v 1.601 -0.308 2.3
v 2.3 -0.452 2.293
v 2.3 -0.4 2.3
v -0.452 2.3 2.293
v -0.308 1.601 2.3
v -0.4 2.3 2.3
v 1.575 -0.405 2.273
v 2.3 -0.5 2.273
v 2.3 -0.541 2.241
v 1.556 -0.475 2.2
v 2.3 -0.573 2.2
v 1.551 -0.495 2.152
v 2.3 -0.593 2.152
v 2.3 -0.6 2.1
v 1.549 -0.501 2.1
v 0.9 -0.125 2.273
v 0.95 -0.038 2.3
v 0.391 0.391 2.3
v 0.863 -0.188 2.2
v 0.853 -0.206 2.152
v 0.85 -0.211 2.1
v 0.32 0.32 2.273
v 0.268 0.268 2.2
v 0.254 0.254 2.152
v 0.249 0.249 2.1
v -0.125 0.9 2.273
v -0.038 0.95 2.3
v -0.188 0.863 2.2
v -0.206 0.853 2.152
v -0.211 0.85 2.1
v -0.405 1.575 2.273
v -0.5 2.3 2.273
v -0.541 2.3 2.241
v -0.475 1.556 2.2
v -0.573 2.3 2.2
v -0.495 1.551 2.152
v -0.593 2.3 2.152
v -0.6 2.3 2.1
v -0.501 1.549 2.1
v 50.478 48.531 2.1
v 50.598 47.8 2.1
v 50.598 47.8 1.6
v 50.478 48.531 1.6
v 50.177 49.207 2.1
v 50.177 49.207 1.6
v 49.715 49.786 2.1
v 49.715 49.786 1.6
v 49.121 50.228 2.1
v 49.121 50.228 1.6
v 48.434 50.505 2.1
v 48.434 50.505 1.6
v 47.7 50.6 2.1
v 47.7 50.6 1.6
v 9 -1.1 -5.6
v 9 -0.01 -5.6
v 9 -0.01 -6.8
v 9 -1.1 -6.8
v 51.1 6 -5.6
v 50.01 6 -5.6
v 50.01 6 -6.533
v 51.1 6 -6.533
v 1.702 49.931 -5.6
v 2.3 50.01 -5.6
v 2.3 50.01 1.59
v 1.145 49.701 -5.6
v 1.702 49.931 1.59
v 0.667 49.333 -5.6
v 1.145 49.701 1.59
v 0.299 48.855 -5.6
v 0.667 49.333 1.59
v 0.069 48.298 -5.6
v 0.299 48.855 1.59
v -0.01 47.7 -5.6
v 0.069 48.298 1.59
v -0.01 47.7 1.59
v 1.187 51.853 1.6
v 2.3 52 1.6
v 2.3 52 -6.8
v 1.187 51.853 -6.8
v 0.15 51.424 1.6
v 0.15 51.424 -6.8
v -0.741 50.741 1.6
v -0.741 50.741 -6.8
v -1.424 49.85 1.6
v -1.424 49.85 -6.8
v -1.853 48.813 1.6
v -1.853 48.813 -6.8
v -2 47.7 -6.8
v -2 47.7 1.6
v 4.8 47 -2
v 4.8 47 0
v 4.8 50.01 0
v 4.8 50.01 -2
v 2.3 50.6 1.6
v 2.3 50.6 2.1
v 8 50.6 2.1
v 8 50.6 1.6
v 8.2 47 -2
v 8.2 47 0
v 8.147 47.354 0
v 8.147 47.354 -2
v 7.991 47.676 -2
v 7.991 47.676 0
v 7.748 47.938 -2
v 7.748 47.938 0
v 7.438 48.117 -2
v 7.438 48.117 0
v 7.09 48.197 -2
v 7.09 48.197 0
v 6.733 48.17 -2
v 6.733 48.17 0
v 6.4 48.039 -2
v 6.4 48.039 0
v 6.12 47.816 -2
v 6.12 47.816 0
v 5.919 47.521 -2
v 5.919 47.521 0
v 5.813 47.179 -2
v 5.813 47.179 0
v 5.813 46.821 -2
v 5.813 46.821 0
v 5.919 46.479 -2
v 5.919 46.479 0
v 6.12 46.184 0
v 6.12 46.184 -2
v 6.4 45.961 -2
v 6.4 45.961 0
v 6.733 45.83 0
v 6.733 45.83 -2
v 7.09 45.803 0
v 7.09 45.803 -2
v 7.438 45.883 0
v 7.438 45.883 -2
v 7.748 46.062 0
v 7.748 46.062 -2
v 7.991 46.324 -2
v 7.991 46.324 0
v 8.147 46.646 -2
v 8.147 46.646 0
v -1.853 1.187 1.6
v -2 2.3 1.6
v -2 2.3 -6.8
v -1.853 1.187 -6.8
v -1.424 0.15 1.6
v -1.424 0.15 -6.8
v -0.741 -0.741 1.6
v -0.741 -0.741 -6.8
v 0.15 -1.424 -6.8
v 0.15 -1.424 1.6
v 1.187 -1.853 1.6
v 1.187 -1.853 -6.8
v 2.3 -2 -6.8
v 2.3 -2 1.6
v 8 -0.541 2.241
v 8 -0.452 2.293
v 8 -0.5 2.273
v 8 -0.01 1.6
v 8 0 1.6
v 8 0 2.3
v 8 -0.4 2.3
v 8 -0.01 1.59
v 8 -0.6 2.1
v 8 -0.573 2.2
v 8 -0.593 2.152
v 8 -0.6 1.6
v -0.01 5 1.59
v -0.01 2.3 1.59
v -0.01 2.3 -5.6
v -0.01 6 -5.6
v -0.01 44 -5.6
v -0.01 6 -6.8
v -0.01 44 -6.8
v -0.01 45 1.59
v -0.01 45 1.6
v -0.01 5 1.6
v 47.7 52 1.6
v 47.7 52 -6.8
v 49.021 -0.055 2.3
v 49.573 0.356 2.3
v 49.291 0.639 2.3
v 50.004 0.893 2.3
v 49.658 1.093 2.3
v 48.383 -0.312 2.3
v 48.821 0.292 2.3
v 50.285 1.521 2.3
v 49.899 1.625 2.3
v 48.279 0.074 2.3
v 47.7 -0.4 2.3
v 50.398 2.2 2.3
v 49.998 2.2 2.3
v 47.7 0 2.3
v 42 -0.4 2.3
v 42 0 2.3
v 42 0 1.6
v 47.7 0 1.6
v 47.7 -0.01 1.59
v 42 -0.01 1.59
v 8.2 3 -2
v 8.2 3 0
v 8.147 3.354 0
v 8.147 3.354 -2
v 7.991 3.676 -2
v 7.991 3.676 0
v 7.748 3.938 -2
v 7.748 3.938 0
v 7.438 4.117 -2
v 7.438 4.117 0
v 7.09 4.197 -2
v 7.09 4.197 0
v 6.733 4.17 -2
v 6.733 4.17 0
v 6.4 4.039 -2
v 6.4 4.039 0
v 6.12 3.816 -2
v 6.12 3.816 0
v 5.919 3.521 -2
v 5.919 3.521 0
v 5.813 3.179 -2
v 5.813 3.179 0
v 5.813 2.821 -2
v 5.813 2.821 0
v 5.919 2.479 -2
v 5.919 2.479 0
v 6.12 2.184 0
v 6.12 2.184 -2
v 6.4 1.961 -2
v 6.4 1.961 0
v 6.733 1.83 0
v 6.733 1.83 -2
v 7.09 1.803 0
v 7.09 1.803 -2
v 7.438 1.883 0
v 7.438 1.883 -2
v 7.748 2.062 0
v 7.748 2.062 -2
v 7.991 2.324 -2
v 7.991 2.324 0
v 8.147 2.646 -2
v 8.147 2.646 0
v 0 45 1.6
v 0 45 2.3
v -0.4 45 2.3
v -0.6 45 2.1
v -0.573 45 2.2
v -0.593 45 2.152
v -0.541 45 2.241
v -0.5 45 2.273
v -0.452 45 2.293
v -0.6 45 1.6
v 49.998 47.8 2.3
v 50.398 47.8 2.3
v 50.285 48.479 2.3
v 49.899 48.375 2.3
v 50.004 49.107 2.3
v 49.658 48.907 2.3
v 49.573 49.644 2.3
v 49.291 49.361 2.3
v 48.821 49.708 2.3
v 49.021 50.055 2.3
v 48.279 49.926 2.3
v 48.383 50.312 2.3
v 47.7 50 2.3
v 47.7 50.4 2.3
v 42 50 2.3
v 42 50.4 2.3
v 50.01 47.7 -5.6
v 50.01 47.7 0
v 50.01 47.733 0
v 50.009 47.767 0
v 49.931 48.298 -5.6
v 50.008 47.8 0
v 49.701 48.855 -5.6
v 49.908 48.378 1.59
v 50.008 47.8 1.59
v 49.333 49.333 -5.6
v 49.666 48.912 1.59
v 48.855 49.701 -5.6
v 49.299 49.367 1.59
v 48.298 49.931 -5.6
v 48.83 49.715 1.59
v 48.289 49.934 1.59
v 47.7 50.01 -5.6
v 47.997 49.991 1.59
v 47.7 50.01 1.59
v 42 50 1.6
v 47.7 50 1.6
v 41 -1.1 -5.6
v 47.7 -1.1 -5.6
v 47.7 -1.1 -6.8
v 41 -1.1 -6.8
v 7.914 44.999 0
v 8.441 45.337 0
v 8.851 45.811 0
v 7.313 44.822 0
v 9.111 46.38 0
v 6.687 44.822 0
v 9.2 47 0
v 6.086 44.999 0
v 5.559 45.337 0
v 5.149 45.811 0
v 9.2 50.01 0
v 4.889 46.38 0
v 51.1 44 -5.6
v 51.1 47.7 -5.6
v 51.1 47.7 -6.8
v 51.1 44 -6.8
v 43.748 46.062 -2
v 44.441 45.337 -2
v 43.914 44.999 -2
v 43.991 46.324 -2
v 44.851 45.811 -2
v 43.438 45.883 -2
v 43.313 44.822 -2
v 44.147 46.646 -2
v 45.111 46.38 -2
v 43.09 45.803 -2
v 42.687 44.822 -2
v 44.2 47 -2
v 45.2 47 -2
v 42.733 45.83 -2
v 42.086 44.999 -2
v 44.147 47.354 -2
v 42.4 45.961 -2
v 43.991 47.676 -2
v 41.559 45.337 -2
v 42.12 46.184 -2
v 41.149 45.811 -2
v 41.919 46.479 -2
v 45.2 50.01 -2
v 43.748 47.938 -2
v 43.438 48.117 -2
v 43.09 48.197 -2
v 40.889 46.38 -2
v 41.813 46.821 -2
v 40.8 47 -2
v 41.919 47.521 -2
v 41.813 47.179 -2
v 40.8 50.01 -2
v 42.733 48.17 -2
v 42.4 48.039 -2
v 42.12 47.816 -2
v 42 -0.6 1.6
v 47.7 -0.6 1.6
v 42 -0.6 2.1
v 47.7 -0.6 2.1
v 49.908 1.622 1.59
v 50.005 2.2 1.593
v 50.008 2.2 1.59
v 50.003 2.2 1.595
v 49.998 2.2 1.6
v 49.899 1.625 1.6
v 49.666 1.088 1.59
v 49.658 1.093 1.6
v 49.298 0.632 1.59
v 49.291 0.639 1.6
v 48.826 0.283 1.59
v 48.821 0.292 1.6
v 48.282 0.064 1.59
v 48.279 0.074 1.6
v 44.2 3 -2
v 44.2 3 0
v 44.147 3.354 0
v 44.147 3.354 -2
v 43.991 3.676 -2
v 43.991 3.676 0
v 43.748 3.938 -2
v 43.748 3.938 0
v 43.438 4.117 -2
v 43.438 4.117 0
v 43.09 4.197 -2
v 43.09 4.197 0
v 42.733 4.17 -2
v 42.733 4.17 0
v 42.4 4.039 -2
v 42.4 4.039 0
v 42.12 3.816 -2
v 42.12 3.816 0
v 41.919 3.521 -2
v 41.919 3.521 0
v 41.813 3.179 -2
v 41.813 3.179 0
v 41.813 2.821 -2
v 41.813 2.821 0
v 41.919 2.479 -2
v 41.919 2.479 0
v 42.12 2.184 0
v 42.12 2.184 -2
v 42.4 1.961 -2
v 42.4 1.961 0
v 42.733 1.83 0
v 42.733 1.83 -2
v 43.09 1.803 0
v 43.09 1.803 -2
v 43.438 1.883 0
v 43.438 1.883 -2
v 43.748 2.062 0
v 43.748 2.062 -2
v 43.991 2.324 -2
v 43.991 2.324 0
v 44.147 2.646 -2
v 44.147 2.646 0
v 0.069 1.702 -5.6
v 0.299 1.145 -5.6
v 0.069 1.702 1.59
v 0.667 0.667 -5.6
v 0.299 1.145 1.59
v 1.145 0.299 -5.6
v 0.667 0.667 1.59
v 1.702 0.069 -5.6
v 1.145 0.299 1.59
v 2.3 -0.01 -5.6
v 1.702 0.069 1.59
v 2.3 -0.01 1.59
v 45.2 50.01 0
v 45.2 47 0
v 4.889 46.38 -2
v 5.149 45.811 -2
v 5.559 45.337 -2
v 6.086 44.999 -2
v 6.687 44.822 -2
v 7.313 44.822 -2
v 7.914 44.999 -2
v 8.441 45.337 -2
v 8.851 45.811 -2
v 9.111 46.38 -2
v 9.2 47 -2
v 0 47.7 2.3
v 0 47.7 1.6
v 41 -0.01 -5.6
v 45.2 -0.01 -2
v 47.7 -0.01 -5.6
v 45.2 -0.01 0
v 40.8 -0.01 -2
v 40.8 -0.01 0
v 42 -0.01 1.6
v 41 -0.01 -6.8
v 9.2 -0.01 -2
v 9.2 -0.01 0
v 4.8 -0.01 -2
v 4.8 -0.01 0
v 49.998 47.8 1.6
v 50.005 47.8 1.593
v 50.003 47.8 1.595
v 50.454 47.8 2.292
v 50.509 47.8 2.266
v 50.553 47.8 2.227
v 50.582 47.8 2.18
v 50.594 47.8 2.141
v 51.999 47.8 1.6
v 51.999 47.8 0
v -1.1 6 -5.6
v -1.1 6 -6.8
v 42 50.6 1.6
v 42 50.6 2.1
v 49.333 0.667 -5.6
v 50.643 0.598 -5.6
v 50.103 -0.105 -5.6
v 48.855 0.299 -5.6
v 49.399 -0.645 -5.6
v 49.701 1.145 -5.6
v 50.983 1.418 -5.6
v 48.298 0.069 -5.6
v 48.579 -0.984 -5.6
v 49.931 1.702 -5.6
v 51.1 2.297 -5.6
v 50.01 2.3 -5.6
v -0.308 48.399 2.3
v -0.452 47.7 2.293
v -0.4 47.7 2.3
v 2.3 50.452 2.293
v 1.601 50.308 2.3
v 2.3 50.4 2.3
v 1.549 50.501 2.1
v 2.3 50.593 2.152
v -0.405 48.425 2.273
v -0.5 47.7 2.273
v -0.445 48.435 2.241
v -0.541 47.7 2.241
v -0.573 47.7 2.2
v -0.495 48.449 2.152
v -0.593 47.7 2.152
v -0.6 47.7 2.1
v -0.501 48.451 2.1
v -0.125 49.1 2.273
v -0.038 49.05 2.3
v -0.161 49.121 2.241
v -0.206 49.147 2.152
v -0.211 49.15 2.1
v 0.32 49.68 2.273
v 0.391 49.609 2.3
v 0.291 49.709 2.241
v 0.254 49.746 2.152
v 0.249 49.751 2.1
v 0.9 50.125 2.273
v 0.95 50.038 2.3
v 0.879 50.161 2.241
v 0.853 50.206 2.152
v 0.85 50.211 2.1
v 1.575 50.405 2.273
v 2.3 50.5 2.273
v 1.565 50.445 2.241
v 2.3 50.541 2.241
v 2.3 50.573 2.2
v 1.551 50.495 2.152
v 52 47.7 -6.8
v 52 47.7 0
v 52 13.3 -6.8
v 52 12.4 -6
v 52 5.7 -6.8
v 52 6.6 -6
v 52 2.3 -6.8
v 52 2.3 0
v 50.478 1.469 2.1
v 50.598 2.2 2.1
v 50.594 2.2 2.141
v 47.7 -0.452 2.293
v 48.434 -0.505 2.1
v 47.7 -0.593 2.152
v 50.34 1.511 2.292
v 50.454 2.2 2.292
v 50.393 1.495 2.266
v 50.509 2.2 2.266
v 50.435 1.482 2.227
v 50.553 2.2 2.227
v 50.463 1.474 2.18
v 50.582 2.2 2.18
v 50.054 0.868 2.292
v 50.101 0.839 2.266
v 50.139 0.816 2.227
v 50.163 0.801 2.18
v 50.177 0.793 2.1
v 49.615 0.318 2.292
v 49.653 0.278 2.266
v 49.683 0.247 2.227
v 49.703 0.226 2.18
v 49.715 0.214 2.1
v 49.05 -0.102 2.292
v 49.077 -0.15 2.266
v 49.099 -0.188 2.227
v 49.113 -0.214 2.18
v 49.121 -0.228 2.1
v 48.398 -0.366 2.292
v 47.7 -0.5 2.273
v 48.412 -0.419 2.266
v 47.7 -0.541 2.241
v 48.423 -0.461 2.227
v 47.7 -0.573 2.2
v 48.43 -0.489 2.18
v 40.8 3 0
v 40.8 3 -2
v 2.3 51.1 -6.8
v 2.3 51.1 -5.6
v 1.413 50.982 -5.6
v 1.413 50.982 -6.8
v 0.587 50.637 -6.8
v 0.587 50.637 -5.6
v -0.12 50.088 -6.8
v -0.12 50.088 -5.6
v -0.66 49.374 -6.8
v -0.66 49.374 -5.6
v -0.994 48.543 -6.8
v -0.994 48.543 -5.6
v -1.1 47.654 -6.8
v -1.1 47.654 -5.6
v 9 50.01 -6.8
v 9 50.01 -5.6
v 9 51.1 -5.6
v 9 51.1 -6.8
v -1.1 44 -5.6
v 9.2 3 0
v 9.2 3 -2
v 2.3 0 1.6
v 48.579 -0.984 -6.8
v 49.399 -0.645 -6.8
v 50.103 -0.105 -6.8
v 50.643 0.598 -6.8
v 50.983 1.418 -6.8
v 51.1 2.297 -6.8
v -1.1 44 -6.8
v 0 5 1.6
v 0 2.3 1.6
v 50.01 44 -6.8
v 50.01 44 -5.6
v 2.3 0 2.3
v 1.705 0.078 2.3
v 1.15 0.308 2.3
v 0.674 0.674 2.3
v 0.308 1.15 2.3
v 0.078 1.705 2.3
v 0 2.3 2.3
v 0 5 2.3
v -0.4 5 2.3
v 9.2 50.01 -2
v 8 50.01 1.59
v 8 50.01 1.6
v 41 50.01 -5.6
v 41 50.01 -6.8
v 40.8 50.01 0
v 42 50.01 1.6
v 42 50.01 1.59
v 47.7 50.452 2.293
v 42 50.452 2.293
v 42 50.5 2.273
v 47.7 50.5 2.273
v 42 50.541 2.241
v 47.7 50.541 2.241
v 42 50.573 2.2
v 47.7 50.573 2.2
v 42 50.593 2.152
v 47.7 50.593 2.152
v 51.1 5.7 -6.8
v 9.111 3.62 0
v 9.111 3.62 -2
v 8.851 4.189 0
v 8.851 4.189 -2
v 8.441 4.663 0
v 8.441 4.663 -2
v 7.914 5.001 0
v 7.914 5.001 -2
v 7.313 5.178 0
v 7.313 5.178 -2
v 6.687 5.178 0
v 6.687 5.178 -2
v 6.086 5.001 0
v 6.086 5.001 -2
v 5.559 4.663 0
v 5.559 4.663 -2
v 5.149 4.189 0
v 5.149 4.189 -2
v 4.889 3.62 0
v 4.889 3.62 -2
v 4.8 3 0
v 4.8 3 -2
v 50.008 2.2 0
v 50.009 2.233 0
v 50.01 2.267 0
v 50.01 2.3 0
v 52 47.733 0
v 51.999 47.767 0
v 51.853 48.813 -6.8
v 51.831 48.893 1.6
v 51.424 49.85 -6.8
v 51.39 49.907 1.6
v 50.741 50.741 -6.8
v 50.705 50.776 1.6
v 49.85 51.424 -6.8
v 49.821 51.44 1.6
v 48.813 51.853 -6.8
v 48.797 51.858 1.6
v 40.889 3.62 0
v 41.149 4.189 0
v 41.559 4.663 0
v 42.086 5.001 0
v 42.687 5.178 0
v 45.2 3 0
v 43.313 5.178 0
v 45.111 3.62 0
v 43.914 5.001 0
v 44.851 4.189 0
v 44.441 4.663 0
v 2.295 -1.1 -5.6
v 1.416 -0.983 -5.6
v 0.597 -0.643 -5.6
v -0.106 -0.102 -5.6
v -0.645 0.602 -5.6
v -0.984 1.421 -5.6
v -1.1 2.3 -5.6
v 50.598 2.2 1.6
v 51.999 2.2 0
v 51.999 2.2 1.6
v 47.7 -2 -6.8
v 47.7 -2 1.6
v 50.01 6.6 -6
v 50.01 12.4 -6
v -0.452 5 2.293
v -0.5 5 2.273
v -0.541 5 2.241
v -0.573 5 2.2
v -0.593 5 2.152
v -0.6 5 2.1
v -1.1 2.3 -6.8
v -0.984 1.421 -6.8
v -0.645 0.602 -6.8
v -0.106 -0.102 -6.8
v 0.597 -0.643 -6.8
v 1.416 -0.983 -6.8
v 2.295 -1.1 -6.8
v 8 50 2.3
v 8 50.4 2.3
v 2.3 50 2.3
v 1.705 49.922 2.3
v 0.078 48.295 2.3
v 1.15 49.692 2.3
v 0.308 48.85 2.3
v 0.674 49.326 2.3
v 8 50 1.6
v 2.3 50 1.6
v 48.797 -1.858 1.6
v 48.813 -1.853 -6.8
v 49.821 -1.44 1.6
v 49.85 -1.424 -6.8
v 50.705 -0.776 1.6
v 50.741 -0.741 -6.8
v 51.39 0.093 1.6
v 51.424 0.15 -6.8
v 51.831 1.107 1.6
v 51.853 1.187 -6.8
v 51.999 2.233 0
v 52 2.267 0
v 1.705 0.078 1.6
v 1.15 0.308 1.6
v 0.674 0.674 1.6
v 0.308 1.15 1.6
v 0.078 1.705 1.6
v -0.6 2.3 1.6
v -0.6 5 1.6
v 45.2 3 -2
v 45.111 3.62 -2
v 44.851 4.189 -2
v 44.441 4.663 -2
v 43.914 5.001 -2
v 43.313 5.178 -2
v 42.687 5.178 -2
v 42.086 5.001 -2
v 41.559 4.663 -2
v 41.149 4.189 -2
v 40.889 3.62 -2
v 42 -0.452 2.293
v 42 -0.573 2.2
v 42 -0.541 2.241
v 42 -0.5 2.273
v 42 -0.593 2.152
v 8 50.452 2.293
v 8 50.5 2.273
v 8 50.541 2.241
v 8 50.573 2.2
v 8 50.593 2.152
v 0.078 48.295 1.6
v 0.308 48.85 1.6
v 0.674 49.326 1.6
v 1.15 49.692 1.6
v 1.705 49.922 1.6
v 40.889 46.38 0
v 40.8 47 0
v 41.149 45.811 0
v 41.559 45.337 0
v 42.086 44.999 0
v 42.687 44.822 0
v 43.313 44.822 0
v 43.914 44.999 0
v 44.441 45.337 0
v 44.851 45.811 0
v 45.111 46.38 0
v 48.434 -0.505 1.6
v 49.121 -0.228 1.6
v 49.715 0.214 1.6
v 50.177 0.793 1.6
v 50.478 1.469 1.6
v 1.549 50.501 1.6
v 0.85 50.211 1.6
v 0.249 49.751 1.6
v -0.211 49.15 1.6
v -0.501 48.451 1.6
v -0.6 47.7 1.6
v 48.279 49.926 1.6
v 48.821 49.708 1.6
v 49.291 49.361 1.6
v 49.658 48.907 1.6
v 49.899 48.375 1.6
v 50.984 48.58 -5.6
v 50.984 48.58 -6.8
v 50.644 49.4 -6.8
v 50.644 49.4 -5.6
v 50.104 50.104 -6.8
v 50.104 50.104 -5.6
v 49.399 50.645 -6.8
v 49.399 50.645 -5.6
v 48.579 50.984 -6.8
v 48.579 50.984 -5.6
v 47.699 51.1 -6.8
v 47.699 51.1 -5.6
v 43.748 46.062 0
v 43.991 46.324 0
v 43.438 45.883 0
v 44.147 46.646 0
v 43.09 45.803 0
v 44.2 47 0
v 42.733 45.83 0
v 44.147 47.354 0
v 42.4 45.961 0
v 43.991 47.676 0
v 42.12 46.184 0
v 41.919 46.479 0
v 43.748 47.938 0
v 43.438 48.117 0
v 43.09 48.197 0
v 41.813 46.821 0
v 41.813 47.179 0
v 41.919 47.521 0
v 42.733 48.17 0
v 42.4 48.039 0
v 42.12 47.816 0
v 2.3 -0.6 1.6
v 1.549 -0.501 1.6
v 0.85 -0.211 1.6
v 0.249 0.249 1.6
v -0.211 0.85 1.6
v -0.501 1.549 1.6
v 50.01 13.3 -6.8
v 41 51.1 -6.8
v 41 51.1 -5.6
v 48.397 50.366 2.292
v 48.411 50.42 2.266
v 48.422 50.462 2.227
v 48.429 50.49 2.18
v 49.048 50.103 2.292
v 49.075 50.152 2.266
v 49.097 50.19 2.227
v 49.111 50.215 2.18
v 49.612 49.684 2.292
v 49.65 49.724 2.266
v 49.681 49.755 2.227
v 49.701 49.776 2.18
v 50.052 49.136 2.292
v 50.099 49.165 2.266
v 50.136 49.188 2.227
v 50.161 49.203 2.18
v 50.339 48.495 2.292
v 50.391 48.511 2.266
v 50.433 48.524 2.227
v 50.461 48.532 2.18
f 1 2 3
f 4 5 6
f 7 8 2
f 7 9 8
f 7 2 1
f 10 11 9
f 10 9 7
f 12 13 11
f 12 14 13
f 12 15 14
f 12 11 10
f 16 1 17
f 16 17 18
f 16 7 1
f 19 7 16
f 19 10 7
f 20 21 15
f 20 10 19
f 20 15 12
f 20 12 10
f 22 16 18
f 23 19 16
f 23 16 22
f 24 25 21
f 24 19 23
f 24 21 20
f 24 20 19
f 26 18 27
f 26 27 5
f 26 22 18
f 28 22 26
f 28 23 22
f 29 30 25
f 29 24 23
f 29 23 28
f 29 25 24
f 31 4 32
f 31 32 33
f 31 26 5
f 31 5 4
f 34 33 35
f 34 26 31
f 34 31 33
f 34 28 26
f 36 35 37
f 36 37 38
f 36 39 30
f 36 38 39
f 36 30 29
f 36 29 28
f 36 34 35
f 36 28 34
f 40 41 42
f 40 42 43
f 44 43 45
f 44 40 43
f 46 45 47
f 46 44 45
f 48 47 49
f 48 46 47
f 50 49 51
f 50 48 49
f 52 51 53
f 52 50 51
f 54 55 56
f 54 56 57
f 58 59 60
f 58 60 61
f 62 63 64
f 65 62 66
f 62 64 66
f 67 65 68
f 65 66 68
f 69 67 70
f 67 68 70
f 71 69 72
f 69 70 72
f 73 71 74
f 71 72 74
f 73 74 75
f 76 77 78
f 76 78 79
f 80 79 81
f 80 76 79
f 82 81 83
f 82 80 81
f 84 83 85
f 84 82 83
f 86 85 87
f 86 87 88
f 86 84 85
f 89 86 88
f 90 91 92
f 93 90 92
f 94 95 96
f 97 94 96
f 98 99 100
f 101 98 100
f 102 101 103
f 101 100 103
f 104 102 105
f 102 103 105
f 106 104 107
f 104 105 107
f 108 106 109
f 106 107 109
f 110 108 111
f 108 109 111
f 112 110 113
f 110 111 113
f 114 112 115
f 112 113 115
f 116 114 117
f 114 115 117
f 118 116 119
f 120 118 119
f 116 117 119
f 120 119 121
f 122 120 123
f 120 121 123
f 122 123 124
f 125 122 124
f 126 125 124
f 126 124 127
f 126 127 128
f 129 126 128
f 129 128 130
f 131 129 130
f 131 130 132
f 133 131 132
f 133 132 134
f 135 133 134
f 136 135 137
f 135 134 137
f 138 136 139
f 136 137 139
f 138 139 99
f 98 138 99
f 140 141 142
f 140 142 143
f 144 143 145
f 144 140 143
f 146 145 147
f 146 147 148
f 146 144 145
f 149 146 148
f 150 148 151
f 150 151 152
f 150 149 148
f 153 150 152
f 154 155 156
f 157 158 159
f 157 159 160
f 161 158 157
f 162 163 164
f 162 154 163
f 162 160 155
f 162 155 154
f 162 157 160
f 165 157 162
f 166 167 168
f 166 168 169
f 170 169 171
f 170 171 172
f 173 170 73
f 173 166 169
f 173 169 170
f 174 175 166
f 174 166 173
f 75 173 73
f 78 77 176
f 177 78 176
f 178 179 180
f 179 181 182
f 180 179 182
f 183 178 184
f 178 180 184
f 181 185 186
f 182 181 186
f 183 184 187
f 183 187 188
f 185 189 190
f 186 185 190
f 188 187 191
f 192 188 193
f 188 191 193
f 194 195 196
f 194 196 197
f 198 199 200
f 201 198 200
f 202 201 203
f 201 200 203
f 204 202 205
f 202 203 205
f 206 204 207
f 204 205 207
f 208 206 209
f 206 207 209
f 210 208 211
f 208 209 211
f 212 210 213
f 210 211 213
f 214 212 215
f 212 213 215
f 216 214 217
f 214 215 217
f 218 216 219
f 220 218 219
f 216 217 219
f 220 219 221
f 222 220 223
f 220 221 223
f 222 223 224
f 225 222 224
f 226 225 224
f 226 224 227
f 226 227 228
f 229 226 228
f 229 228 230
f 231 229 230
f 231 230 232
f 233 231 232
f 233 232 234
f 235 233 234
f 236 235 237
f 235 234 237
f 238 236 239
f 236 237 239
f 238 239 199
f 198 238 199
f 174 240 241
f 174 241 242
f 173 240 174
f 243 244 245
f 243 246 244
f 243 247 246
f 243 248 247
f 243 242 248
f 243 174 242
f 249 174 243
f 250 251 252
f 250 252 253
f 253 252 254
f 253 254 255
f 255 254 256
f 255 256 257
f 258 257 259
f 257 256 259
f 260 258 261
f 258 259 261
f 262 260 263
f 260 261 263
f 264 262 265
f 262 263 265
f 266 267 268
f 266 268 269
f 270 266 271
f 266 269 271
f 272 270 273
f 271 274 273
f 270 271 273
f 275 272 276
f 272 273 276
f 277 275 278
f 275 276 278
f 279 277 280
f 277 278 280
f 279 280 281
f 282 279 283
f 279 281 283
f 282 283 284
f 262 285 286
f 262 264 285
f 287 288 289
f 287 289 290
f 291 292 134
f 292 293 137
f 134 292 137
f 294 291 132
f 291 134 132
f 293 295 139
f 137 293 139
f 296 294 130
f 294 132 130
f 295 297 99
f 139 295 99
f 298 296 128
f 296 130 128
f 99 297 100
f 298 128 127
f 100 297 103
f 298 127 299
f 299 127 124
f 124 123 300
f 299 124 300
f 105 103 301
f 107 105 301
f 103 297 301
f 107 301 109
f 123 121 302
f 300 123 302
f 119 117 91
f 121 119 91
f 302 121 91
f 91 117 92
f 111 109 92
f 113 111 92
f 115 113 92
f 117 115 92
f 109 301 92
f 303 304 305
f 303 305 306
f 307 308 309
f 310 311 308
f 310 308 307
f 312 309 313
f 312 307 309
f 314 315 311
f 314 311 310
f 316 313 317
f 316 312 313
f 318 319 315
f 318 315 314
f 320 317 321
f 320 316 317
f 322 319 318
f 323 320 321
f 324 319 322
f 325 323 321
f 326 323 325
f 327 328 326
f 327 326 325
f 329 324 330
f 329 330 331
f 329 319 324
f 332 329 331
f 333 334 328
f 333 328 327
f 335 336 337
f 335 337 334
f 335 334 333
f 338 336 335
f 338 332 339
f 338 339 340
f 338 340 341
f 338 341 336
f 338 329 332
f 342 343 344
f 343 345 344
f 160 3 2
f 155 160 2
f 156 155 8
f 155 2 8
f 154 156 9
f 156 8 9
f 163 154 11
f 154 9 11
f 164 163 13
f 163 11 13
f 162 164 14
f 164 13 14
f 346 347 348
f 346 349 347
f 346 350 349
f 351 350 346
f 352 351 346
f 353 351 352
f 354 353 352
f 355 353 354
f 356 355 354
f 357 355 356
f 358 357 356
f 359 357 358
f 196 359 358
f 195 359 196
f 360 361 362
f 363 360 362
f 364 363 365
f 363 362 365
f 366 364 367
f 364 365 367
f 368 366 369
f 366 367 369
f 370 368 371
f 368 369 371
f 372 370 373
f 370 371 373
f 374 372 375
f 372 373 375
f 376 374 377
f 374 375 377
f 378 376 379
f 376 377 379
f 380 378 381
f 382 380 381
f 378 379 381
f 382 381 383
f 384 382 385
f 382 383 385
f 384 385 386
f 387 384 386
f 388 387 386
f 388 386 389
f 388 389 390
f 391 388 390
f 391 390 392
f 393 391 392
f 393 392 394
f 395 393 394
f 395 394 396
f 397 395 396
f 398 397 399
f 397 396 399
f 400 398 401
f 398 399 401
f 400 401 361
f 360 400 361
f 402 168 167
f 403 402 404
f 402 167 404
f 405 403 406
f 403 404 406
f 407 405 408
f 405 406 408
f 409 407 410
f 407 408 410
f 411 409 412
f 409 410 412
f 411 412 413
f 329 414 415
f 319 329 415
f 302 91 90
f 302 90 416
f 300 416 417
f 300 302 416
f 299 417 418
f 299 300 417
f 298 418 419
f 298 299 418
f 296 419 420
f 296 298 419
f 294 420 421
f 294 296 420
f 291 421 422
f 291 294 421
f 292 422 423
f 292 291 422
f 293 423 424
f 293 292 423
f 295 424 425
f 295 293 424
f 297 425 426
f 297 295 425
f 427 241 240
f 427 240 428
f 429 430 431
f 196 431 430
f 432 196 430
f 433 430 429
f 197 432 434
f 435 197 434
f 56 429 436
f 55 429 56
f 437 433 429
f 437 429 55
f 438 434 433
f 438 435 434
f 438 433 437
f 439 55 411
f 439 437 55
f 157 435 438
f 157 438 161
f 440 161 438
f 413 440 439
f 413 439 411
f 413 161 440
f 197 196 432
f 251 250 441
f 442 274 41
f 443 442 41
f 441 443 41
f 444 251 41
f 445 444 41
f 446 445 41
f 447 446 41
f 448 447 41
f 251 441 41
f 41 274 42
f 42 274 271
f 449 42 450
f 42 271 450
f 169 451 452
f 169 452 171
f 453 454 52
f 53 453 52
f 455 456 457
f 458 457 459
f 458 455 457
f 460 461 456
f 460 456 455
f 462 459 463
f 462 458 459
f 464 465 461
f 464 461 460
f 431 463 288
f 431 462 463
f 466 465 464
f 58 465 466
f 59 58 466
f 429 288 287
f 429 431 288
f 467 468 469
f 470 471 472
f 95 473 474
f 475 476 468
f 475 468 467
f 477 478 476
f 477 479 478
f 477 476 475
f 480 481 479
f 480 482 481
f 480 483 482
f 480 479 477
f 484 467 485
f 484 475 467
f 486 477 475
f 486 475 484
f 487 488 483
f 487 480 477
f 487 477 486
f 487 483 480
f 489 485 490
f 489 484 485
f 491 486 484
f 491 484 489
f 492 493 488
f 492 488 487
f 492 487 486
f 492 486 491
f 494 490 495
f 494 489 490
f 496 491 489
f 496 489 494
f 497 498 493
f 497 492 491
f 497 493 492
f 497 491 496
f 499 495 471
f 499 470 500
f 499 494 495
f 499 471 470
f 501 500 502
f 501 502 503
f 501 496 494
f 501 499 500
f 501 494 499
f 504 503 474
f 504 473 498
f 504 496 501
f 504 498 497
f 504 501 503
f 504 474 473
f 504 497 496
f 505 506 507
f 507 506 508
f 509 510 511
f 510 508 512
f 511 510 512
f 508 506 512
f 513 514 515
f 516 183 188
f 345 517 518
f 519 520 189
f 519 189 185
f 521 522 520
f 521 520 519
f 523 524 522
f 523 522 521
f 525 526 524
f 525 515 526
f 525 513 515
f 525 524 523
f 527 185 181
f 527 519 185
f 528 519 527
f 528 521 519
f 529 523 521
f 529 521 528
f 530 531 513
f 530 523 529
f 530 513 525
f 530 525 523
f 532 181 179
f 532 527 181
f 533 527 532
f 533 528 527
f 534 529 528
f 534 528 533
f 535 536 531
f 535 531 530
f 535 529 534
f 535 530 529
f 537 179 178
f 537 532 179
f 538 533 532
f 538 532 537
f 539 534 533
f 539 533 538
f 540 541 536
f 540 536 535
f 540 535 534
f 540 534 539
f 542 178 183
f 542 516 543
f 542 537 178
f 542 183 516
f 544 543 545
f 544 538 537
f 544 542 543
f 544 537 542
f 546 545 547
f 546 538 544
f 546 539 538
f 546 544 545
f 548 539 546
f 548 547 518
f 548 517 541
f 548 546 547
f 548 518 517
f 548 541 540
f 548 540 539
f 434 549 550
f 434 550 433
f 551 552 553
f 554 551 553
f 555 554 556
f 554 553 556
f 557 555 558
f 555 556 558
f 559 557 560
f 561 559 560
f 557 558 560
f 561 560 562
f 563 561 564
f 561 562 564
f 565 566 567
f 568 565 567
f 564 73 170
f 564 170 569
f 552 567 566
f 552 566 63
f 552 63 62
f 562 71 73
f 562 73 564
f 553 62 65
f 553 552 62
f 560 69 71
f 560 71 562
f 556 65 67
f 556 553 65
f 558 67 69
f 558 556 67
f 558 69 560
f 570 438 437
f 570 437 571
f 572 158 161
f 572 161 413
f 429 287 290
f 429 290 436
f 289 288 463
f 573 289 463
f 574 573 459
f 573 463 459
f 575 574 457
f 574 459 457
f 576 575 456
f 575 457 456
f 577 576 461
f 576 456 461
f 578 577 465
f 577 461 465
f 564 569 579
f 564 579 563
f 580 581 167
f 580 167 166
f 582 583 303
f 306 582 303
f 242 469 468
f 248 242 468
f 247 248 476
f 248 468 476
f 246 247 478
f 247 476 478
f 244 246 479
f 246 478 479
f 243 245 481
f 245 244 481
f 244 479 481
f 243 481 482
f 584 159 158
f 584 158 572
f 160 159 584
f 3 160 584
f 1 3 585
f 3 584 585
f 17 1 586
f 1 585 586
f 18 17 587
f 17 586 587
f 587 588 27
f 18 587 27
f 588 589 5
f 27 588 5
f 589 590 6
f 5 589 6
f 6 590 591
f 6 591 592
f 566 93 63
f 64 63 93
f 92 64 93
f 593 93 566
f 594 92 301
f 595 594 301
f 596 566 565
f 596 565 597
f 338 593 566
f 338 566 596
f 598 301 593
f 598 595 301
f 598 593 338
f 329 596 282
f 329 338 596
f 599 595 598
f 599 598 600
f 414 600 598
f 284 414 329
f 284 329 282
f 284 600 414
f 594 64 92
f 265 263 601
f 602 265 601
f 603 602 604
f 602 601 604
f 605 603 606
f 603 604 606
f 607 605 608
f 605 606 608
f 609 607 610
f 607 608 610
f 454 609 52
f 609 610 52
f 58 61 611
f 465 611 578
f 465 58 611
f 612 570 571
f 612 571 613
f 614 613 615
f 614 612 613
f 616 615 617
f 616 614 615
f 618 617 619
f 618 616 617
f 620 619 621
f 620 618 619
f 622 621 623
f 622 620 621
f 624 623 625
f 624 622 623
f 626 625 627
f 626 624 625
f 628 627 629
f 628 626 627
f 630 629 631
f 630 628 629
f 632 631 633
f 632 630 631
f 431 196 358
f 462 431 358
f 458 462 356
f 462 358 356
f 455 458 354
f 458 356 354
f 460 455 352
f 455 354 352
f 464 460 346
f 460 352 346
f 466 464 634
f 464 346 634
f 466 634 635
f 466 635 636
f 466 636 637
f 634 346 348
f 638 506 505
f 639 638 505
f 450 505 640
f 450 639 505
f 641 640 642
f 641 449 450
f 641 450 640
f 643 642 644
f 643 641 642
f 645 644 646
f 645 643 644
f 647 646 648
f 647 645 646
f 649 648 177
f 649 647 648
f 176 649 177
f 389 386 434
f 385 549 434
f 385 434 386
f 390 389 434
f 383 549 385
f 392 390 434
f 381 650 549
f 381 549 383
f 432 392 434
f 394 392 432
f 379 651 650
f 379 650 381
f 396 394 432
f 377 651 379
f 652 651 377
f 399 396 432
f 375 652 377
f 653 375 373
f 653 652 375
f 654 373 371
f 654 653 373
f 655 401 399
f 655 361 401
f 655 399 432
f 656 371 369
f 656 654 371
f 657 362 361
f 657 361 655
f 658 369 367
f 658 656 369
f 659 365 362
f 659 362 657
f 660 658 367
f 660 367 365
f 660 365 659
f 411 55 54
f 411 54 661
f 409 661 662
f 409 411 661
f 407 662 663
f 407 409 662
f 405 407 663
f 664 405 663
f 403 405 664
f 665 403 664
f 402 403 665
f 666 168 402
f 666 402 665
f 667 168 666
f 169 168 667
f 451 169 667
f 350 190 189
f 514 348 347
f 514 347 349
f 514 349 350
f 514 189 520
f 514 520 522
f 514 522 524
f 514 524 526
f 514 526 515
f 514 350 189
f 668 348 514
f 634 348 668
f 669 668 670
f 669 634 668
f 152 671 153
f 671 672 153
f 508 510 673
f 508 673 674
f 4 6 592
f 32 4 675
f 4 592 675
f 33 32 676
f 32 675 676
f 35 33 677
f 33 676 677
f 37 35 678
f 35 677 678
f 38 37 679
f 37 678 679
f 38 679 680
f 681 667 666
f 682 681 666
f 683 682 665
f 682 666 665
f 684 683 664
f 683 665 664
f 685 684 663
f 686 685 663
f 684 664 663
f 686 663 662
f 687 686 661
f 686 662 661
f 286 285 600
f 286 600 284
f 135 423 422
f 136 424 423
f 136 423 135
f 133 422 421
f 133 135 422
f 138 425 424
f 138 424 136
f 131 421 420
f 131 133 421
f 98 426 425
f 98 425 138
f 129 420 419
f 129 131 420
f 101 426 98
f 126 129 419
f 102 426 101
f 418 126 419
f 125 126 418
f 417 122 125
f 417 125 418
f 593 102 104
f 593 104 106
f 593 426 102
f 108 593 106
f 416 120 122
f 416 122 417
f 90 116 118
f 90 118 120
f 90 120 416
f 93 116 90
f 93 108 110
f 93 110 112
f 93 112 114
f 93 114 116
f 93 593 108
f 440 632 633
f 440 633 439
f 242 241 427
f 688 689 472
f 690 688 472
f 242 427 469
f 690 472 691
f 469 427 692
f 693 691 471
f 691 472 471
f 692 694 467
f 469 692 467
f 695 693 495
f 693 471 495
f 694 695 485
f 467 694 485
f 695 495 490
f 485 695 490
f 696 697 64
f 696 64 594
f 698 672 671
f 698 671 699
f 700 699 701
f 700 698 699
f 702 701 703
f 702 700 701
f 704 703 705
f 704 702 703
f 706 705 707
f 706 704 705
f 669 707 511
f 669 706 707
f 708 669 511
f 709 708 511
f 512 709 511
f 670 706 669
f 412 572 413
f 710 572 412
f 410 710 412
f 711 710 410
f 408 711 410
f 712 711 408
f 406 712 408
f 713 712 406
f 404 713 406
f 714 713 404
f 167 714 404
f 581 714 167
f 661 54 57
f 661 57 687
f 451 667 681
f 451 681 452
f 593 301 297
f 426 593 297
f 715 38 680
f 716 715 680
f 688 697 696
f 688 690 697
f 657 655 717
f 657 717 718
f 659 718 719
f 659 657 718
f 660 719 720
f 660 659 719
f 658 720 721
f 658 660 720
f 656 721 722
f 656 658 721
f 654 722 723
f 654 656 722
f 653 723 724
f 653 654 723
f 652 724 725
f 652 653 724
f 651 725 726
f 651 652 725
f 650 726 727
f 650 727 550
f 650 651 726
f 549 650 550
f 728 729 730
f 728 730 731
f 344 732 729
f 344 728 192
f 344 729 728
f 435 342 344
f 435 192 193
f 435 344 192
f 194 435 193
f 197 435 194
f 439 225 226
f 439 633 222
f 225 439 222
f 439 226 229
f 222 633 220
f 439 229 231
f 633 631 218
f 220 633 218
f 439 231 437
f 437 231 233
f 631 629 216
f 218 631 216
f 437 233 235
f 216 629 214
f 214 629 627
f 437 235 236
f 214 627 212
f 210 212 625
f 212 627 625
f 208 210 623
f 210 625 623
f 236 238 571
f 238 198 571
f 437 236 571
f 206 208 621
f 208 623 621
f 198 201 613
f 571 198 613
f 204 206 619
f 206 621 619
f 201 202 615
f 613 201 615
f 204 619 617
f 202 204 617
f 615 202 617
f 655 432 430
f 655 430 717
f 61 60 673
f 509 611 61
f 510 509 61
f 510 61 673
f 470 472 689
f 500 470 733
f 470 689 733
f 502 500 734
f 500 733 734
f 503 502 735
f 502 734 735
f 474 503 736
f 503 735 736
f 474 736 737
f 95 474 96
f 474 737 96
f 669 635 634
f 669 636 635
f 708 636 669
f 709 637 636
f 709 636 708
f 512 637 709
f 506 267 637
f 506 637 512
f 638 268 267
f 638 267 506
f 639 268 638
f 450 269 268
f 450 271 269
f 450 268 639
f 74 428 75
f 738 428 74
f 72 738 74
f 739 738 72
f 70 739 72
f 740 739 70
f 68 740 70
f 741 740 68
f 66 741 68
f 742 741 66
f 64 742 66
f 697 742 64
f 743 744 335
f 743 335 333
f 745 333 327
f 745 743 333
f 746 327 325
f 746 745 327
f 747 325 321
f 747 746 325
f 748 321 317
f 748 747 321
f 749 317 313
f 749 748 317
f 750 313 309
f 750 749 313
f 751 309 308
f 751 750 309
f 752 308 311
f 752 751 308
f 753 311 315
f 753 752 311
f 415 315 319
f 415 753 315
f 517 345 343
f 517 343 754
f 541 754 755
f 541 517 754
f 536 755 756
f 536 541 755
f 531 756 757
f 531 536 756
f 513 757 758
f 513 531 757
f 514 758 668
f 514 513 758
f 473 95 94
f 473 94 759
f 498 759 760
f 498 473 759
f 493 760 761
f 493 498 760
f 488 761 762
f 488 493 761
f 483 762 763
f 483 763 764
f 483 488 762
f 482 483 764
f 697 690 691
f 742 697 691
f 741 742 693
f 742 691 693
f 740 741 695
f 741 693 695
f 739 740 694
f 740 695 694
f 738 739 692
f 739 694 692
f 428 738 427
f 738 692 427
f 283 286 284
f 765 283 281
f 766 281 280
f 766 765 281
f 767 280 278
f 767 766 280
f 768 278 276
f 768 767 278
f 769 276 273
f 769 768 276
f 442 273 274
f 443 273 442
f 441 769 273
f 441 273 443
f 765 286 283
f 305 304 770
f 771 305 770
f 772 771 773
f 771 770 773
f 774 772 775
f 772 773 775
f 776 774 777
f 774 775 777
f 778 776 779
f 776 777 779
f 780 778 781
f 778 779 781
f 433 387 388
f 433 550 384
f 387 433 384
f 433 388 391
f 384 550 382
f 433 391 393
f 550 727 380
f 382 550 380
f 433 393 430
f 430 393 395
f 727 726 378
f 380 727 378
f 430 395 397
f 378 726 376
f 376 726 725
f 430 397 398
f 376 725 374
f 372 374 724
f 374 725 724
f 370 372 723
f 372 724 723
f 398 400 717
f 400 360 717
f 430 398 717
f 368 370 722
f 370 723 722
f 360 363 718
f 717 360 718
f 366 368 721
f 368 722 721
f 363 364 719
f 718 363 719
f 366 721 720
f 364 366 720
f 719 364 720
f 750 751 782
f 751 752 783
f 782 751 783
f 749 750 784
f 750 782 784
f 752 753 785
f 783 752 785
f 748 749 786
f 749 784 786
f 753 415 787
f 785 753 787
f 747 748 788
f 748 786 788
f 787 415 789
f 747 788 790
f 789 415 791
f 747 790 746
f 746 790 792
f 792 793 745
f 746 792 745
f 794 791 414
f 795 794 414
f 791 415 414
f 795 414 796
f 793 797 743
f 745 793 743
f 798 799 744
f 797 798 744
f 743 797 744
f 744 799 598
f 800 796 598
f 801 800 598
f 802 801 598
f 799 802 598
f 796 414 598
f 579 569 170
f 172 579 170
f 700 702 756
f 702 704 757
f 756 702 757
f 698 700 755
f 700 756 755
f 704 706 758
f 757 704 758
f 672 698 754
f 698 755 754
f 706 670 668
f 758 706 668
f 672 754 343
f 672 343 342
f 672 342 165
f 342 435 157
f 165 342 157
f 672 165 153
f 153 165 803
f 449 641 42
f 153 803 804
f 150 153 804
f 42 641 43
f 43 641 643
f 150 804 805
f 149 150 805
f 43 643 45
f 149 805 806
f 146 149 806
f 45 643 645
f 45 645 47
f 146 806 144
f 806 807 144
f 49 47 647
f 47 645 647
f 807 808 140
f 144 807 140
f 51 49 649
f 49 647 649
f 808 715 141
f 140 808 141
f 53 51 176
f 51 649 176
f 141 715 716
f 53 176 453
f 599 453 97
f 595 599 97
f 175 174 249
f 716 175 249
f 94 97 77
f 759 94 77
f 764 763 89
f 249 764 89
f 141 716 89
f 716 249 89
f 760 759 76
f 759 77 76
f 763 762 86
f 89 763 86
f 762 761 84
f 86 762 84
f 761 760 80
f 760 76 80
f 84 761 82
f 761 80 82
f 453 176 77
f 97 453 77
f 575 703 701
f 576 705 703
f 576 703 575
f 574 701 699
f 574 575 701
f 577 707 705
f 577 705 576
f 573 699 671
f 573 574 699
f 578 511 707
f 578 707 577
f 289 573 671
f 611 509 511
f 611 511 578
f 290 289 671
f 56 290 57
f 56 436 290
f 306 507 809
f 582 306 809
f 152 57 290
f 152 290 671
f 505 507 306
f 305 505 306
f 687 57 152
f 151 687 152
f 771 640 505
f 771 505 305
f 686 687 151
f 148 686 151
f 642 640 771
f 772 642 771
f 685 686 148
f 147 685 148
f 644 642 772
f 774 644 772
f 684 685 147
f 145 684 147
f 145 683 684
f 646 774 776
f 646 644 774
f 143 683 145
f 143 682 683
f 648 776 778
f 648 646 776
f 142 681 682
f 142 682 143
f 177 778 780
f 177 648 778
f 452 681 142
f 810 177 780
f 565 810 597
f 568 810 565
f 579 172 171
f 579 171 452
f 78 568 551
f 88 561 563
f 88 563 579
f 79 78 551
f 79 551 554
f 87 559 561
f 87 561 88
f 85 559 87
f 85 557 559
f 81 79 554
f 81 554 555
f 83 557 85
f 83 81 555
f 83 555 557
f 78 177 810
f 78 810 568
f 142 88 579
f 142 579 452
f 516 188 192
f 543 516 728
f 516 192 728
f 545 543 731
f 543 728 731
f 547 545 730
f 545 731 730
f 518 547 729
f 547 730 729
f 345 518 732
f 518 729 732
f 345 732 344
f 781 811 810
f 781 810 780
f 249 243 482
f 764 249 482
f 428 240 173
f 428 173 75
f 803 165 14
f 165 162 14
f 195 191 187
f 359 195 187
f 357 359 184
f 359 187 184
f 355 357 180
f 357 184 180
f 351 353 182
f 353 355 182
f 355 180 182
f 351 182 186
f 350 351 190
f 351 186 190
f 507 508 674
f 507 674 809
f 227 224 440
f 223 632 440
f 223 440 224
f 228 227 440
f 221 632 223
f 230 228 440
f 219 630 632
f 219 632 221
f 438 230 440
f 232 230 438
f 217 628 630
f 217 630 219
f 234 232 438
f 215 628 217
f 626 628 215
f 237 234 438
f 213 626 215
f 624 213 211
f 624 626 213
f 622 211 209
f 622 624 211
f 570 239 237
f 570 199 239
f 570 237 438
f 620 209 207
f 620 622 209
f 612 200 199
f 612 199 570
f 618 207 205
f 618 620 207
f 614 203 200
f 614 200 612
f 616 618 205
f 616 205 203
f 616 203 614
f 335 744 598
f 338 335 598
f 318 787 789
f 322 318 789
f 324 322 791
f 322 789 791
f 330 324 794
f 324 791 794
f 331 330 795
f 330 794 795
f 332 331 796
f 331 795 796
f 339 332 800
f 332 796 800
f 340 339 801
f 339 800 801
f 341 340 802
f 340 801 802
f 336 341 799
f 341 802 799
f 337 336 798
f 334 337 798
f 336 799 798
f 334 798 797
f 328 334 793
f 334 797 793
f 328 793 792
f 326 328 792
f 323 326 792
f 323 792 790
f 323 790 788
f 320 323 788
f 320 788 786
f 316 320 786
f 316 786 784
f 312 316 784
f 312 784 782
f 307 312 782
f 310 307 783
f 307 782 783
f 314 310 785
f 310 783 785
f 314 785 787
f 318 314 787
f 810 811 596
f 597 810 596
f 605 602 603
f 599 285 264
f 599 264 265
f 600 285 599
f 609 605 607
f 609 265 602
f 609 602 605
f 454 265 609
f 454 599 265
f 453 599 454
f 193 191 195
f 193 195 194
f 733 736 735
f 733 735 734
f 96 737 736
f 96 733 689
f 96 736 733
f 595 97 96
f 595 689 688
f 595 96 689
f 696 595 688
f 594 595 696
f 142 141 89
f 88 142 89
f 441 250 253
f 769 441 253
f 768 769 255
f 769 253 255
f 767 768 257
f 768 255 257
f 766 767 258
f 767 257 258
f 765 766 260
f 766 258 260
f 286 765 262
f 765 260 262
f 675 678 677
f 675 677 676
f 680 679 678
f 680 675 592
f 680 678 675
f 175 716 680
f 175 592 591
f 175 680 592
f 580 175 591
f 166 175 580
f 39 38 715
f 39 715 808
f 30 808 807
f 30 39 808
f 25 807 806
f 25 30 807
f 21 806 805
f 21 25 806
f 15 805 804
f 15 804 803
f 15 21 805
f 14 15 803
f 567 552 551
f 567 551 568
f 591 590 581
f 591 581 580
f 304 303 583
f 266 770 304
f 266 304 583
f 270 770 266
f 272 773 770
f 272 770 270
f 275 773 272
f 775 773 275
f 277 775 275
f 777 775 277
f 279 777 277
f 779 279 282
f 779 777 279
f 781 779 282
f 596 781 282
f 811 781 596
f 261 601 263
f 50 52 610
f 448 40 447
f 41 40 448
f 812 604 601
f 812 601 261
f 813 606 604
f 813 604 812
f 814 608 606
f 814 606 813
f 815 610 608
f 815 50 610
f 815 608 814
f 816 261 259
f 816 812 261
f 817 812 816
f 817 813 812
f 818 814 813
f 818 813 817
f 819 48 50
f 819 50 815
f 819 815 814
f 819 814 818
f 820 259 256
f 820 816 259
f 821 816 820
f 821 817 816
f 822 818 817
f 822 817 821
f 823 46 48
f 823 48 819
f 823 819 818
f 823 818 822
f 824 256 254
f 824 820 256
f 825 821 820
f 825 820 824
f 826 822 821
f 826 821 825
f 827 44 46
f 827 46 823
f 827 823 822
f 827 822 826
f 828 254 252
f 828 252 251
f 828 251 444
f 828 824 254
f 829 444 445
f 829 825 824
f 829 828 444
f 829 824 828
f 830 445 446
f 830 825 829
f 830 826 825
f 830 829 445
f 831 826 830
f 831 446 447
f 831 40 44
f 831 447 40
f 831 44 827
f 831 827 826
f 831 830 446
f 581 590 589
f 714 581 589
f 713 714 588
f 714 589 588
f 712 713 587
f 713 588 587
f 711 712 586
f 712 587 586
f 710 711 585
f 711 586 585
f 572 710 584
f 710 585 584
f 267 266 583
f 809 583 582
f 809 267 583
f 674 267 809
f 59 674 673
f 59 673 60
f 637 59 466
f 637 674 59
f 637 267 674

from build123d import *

# Parameters (mm, degrees)
EXTRUDE006_DEPTH                     = 2
EXTRUDE006_ONTO_SKETCH006_ROLL_ANGLE = 90
EXTRUDE006_PLACEMENT_ANGLE           = 90
SKETCH_W                             = 14.047477
SKETCH_H                             = 45.6
EXTRUDE004_DEPTH                     = 10
SKETCH002_R                          = 1.2
EXTRUDE001_DEPTH                     = 2
EXTRUDE005_DEPTH                     = 10
EXTRUDE003_DEPTH                     = 0.7
EXTRUDE003_DEPTH_BACK                = 0.2
FILLET_R                             = 0.2
CHAMFER_SIZE                         = 0.2
EXTRUDE002_DEPTH                     = 2
EXTRUDE_DEPTH                        = 1.6
EXTRUDE_DEPTH_BACK                   = 6.8


with BuildPart() as extrude006:
    # Sketch006 as drawn → Extrude006 (new, symmetric)
    with BuildSketch(Plane.XY):
        Polygon((-3.8, 0), (-2.9, 0.8), (2.9, 0.8), (3.8, 0), align=None)
    extrude(amount=EXTRUDE006_DEPTH, both=True)


with BuildPart() as extrude006_1:
    # Extrude006 onto Sketch006 roll: moved
    add(extrude006.part.rotate(Axis((0, 0, 0), (1, 0, 0)), EXTRUDE006_ONTO_SKETCH006_ROLL_ANGLE))


with BuildPart() as extrude006_2:
    # Extrude006 onto Sketch006 placement: moved
    add(extrude006_1.part)


with BuildPart() as extrude006_3:
    # Extrude006 placement: moved
    add(extrude006_2.part.moved(Location((50, 9.5, -6.8))).rotate(Axis((50, 9.5, -6.8), (0, 0, 1)), EXTRUDE006_PLACEMENT_ANGLE))


with BuildPart() as extrude004:
    # Sketch → Extrude004 (new body)
    with BuildSketch(Plane.XY):
        with Locations((51.252235, 25)):
            Rectangle(SKETCH_W, SKETCH_H)
    extrude(amount=EXTRUDE004_DEPTH)


with BuildPart() as extrude001:
    # Sketch002 → Extrude001 (new body)
    with BuildSketch(Plane.XY):
        with BuildLine():
            Line((4.8, 47), (4.8, 51))
            Line((4.8, 51), (9.2, 51))
            Line((9.2, 51), (9.2, 47.000001))
            ThreePointArc((4.8, 47), (7, 44.8), (9.2, 47.000001))
        make_face()
        with Locations((7, 47)):
            Circle(SKETCH002_R, mode=Mode.SUBTRACT)
        with BuildLine():
            ThreePointArc((9.2, 3), (7, 5.2), (4.8, 3))
            Line((4.8, 3), (4.8, -1))
            Line((4.8, -1), (9.2, -1))
            Line((9.2, -1), (9.2, 3))
        make_face()
        with Locations((7, 3)):
            Circle(SKETCH002_R, mode=Mode.SUBTRACT)
        with BuildLine():
            Line((40.8, 47), (40.8, 51))
            Line((40.8, 51), (45.2, 51))
            Line((45.2, 51), (45.2, 46.999987))
            ThreePointArc((40.8, 47), (42.999993, 44.8), (45.2, 46.999987))
        make_face()
        with Locations((43, 47)):
            Circle(SKETCH002_R, mode=Mode.SUBTRACT)
        with BuildLine():
            ThreePointArc((45.2, 3), (43, 5.2), (40.8, 3))
            Line((40.8, 3), (40.8, -1))
            Line((40.8, -1), (45.2, -1))
            Line((45.2, -1), (45.2, 3))
        make_face()
        with Locations((43, 3)):
            Circle(SKETCH002_R, mode=Mode.SUBTRACT)
    extrude(amount=-EXTRUDE001_DEPTH)


with BuildPart() as extrude005:
    # Sketch005 → Extrude005 (new body)
    with BuildSketch(Plane.XY):
        Polygon((8, 53), (8, 45), (-3, 45), (-3, 5), (8, 5), (8, -3), (42, -3), (42, 5), (53, 5), (53, 45), (42, 45), (42, 53), align=None)
    extrude(amount=EXTRUDE005_DEPTH)


with BuildPart() as cut003:
    # Sketch004 → Extrude003 (new body, two sides)
    with BuildSketch(Plane.XY) as extrude003_sk:
        with BuildLine():
            Line((2.3, 50.6), (47.7, 50.6))
            ThreePointArc((50.6, 47.7), (49.75061, 49.75061), (47.7, 50.6))
            Line((50.6, 47.7), (50.6, 2.3))
            ThreePointArc((47.7, -0.6), (49.75061, 0.24939), (50.6, 2.3))
            Line((47.7, -0.6), (2.3, -0.6))
            ThreePointArc((-0.6, 2.3), (0.24939, 0.24939), (2.3, -0.6))
            Line((-0.6, 2.3), (-0.6, 47.7))
            ThreePointArc((2.3, 50.6), (0.24939, 49.75061), (-0.6, 47.7))
        make_face()
        with BuildLine():
            Line((2.3, 50), (47.7, 50))
            ThreePointArc((50, 47.7), (49.326346, 49.326346), (47.7, 50))
            Line((50, 47.7), (50, 2.3))
            ThreePointArc((47.7, 0), (49.326346, 0.673654), (50, 2.3))
            Line((47.7, 0), (2.3, 0))
            ThreePointArc((0, 2.3), (0.673654, 0.673654), (2.3, 0))
            Line((0, 2.3), (0, 47.7))
            ThreePointArc((2.3, 50), (0.673654, 49.326346), (0, 47.7))
        make_face(mode=Mode.SUBTRACT)
    extrude(amount=EXTRUDE003_DEPTH)
    extrude(extrude003_sk.sketch, amount=-EXTRUDE003_DEPTH_BACK)


with BuildPart() as cut003_1:
    # Extrude003 placement: moved
    add(cut003.part.moved(Location((0, 0, 1.6))))

    # Fillet
    fillet_edges = [cut003_1.edges().sort_by_distance(p)[0] for p in [
        (-0.6, 25, 2.3),
        (0.24939, 49.75061, 2.3),
        (25, 50.6, 2.3),
        (49.75061, 49.75061, 2.3),
        (50.6, 25, 2.3),
        (49.75061, 0.24939, 2.3),
        (25, -0.6, 2.3),
        (0.24939, 0.24939, 2.3),
    ]]
    fillet(fillet_edges, radius=FILLET_R)

    # Chamfer
    chamfer_edges = [cut003_1.edges().sort_by_distance(p)[0] for p in [
        (0, 25, 1.4),
        (0.673654, 49.326346, 1.4),
        (25, 50, 1.4),
        (49.326346, 49.326346, 1.4),
        (50, 25, 1.4),
        (49.326346, 0.673654, 1.4),
        (25, 0, 1.4),
        (0.673654, 0.673654, 1.4),
    ]]
    chamfer(chamfer_edges, length=CHAMFER_SIZE)

    # Cut003: cut Extrude005
    add(extrude005.part, mode=Mode.SUBTRACT)


with BuildPart() as extrude002:
    # Sketch003 → Extrude002 (new body)
    with BuildSketch(Plane.XY):
        with BuildLine():
            Line((2.3, 51.1), (9, 51.1))
            Line((9, 44), (9, 51.1))
            Line((-1.1, 44), (9, 44))
            Line((-1.1, 44), (-1.1, 47.654452))
            ThreePointArc((2.3, 51.1), (-0.12032, 50.088024), (-1.1, 47.654452))
        make_face()
        with BuildLine():
            Line((51.1, 47.699699), (51.1, 44))
            Line((41, 44), (51.1, 44))
            Line((41, 51.1), (41, 44))
            Line((41, 51.1), (47.698586, 51.1))
            ThreePointArc((51.1, 47.699699), (50.103681, 50.104468), (47.698586, 51.1))
        make_face()
        with BuildLine():
            Line((47.6997, -1.1), (41, -1.1))
            Line((41, -1.1), (41, 6))
            Line((41, 6), (51.1, 6))
            Line((51.1, 6), (51.1, 2.297304))
            ThreePointArc((47.6997, -1.1), (50.103016, -0.105134), (51.1, 2.297304))
        make_face()
        with BuildLine():
            Line((-1.1, 2.300296), (-1.1, 6))
            Line((-1.1, 6), (9, 6))
            Line((9, 6), (9, -1.1))
            Line((9, -1.1), (2.294563, -1.1))
            ThreePointArc((-1.1, 2.300296), (-0.106103, -0.10205), (2.294563, -1.1))
        make_face()
    extrude(amount=-EXTRUDE002_DEPTH)


with BuildPart() as extrude002_1:
    # Extrude002 placement: moved
    add(extrude002.part.moved(Location((0, 0, -5.6))))


with BuildPart() as cut004:
    # Sketch001 → Extrude (new body, two sides)
    with BuildSketch(Plane.XY) as extrude_sk:
        with BuildLine():
            Line((2.3, 52), (47.7, 52))
            ThreePointArc((52, 47.7), (50.740559, 50.740559), (47.7, 52))
            Line((52, 47.7), (52, 2.3))
            ThreePointArc((47.7, -2), (50.740559, -0.740559), (52, 2.3))
            Line((47.7, -2), (2.3, -2))
            ThreePointArc((-2, 2.3), (-0.740559, -0.740559), (2.3, -2))
            Line((-2, 2.3), (-2, 47.7))
            ThreePointArc((2.3, 52), (-0.740559, 50.740559), (-2, 47.7))
        make_face()
        with BuildLine():
            Line((2.3, 50.01), (47.7, 50.01))
            ThreePointArc((50.01, 47.7), (49.333417, 49.333417), (47.7, 50.01))
            Line((50.01, 47.7), (50.01, 2.3))
            ThreePointArc((47.7, -0.01), (49.333417, 0.666583), (50.01, 2.3))
            Line((47.7, -0.01), (2.3, -0.01))
            ThreePointArc((-0.01, 2.3), (0.666583, 0.666583), (2.3, -0.01))
            Line((-0.01, 2.3), (-0.01, 47.7))
            ThreePointArc((2.3, 50.01), (0.666583, 49.333417), (-0.01, 47.7))
        make_face(mode=Mode.SUBTRACT)
    extrude(amount=EXTRUDE_DEPTH)
    extrude(extrude_sk.sketch, amount=-EXTRUDE_DEPTH_BACK)

    # Cut002: cut Extrude002
    add(extrude002_1.part, mode=Mode.SUBTRACT)

    # Fusion001: union Cut003
    add(cut003_1.part)

    # Fusion002: union Extrude001
    add(extrude001.part)

    # Cut: cut Extrude004
    add(extrude004.part, mode=Mode.SUBTRACT)

    # Cut004: cut Extrude006
    add(extrude006_3.part, mode=Mode.SUBTRACT)


solid = cut004.part
